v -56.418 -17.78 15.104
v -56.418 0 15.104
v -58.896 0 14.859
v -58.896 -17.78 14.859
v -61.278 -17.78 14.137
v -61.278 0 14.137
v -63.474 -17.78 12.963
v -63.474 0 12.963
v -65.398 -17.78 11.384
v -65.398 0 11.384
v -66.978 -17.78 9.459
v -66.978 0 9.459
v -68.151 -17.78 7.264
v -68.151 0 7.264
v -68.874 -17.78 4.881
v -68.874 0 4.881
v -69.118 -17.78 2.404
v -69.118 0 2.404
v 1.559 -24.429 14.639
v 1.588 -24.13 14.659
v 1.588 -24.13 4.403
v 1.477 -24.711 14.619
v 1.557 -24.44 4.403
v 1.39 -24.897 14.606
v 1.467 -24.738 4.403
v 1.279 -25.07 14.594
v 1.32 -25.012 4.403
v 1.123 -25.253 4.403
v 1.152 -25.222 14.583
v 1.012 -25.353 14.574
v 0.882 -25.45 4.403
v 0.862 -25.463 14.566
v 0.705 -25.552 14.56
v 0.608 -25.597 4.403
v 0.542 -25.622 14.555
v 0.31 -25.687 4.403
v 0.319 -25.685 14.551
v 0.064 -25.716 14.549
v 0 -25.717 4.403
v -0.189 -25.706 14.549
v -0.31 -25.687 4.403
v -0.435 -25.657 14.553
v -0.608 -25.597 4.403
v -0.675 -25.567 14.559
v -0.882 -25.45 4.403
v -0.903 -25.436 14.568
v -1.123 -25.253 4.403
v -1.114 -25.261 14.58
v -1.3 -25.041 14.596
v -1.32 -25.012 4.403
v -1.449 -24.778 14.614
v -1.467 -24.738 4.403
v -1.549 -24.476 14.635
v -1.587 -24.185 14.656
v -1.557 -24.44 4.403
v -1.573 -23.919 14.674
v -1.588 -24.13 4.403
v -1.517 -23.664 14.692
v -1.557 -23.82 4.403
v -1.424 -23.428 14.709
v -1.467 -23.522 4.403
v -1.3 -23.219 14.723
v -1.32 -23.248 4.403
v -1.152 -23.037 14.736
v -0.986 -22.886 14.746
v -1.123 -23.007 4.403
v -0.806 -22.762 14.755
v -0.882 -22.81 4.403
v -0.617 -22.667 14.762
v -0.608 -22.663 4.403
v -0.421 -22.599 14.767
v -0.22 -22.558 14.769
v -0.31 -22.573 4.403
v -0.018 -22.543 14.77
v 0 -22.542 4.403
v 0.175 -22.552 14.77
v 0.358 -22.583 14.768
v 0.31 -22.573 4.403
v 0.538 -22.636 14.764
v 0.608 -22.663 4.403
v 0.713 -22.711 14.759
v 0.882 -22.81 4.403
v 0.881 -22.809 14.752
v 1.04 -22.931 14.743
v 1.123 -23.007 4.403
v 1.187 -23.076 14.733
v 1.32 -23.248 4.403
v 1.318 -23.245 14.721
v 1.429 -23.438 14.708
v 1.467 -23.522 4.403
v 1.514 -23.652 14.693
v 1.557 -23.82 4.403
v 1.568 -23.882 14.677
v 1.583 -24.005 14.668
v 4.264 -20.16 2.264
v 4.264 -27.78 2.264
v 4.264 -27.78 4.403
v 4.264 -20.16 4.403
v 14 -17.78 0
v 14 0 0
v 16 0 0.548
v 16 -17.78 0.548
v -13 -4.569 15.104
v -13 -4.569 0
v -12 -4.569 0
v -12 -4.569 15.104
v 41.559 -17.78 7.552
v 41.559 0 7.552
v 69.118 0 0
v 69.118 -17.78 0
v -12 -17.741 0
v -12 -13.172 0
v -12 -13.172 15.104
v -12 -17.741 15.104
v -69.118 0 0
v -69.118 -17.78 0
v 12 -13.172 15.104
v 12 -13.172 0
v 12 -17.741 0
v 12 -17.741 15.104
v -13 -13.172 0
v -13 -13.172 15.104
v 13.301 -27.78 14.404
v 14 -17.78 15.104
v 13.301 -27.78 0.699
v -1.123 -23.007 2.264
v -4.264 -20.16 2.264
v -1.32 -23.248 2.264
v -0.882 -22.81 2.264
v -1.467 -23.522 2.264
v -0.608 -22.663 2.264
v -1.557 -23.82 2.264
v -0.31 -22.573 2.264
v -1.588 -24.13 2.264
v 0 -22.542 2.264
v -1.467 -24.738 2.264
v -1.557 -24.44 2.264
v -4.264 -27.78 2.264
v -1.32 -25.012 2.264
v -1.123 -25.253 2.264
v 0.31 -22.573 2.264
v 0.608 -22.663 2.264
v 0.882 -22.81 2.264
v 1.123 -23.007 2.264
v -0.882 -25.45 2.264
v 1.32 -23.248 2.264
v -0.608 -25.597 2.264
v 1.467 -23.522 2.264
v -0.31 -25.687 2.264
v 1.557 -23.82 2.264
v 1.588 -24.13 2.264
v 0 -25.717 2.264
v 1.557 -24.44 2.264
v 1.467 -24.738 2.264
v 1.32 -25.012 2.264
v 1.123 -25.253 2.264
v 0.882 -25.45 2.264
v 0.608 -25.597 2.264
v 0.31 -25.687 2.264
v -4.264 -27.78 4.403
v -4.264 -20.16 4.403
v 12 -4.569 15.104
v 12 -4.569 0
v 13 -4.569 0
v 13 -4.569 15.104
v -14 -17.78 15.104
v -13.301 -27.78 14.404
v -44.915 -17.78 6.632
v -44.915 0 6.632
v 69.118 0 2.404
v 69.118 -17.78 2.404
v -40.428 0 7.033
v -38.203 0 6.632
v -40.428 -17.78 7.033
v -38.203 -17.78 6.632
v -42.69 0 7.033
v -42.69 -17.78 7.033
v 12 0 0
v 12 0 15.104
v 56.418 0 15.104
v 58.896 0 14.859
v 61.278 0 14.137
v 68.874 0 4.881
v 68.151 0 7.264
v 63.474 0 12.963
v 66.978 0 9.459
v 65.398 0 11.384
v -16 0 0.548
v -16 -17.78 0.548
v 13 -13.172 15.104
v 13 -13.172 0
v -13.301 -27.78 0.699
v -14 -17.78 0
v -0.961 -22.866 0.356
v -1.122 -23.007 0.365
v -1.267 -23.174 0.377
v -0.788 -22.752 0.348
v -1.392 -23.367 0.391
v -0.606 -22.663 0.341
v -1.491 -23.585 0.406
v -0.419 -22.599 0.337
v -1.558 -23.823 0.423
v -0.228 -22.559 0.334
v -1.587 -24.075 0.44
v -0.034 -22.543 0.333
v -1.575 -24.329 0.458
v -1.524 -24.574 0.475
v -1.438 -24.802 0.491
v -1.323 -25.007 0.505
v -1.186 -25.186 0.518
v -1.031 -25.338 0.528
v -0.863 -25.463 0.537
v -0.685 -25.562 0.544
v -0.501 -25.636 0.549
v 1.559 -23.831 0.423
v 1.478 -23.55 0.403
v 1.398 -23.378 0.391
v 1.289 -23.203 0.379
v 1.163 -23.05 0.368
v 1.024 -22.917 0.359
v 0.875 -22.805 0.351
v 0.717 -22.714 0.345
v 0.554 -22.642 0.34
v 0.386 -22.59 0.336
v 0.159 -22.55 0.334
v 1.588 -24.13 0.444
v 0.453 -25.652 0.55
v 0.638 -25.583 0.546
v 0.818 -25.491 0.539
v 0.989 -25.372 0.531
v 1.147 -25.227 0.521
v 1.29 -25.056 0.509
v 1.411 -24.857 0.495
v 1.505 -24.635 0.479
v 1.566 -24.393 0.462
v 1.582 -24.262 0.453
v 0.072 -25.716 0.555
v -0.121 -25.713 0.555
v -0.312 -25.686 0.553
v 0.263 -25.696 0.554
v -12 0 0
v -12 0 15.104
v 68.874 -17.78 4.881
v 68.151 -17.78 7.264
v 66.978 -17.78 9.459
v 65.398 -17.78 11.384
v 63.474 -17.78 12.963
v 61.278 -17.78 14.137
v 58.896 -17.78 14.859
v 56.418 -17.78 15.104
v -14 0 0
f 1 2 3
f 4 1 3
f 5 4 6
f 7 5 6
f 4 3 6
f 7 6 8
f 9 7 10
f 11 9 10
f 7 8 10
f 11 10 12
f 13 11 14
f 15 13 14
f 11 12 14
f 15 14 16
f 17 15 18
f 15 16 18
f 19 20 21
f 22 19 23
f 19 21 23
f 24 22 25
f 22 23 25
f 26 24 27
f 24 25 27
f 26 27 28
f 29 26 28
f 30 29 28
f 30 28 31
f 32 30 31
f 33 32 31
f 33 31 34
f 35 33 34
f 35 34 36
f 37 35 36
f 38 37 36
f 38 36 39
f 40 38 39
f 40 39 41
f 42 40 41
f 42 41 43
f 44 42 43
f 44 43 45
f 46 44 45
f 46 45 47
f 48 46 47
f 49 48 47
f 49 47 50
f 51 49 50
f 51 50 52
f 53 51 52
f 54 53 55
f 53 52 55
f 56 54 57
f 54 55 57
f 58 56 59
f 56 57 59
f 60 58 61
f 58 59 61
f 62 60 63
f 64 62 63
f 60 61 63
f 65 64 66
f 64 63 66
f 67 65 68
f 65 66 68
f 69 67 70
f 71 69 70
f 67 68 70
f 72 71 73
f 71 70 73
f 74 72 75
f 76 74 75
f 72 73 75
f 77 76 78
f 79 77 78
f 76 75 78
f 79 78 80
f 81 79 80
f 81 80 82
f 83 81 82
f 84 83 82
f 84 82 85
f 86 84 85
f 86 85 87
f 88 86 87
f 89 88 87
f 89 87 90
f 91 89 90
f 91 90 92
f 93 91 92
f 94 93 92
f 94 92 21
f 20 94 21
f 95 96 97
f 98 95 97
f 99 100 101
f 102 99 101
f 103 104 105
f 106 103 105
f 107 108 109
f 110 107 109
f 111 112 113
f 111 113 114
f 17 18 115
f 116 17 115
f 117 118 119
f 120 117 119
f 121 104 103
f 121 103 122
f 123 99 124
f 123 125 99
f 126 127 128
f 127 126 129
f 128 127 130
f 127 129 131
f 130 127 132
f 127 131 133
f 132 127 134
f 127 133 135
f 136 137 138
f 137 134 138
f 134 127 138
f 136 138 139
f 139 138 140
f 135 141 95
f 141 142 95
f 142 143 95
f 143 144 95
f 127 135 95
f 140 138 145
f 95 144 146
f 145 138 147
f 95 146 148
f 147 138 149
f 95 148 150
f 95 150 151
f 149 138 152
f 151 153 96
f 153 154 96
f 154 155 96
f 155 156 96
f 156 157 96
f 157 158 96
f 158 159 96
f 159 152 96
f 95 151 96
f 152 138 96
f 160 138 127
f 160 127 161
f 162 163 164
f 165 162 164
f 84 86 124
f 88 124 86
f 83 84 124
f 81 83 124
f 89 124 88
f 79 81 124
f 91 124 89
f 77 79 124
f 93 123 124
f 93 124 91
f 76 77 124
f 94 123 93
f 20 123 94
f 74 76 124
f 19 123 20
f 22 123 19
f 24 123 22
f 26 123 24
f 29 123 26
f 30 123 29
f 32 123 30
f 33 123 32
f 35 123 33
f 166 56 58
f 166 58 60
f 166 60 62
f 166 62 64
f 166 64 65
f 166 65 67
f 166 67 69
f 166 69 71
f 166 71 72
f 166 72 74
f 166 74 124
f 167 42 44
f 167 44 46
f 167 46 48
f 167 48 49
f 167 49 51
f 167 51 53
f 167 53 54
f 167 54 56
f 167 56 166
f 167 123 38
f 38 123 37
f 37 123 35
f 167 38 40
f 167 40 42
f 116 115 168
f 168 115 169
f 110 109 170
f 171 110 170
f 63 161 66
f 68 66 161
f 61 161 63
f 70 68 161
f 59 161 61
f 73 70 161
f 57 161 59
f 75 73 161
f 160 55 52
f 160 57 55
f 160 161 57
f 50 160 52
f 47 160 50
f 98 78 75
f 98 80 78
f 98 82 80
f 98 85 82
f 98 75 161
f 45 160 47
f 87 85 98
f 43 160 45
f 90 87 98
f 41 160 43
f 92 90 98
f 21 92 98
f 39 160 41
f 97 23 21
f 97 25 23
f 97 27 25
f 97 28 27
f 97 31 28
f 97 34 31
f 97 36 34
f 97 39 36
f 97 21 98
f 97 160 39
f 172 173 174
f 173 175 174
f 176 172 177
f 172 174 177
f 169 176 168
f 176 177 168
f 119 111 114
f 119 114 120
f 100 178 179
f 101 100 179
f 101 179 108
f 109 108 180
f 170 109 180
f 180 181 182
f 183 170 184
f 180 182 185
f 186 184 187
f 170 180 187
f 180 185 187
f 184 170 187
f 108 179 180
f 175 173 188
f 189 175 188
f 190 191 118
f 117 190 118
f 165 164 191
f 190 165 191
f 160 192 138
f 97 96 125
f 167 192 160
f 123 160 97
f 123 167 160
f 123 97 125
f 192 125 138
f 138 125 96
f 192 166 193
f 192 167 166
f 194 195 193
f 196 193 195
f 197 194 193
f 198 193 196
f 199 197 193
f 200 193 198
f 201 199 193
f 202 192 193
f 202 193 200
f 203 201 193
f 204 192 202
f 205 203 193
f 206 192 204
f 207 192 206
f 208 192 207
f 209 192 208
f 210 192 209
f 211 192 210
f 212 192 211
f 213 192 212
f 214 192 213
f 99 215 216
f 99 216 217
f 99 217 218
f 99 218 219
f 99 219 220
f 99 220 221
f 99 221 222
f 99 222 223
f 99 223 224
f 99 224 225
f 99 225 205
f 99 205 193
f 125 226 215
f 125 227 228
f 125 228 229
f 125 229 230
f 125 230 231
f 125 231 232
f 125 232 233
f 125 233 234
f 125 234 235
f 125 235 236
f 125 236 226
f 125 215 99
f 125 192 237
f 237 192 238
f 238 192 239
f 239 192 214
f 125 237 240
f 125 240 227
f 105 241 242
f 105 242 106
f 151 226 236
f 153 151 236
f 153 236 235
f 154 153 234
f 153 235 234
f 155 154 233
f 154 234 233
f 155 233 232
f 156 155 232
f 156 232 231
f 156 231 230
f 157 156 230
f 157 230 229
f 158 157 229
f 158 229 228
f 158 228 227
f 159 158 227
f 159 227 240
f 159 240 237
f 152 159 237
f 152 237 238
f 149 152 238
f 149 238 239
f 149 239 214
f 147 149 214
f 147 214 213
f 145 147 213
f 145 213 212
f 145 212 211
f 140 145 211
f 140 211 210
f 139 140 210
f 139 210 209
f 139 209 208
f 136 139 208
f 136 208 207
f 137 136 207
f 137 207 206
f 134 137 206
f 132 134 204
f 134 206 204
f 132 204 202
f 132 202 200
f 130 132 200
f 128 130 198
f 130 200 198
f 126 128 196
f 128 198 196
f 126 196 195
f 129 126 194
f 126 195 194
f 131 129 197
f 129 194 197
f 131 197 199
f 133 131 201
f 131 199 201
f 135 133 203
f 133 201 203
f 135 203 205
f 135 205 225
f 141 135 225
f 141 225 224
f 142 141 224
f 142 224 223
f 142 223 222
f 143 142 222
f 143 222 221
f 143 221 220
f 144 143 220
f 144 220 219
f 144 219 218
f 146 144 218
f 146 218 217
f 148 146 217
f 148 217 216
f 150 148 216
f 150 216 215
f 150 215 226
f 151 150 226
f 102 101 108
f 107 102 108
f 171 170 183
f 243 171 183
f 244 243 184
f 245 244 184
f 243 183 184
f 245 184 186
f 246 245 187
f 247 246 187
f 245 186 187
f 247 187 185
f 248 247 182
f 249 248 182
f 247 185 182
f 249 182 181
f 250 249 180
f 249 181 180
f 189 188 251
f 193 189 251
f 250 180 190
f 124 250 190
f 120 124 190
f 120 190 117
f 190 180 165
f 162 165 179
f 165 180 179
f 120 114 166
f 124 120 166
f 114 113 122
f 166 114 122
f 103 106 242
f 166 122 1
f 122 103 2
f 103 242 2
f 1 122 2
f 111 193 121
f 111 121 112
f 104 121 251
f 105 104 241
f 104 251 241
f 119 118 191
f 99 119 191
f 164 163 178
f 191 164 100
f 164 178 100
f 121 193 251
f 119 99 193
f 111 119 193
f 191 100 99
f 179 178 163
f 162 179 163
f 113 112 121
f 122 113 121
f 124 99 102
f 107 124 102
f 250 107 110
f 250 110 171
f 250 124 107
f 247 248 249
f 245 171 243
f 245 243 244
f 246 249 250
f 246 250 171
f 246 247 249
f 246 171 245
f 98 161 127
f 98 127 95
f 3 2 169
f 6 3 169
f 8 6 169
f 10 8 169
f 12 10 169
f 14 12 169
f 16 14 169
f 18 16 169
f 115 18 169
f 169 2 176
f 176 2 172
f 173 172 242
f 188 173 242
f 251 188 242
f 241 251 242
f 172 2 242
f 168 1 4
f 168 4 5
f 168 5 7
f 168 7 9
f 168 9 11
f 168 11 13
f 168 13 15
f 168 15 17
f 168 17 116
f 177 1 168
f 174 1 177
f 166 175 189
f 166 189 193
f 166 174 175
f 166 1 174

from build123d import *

# Parameters (mm, degrees)
F0_W     = 14
F0_H     = 15.1035089948
F1_DEPTH = 17.78
F2_W     = 28
F2_H     = 15.1035089948
F3_DEPTH = 10
F3_TAPER = 4
F4_R     = 12.7
F5_W     = 1
F5_H     = 8.6030326784
F5_W_2   = 24
F5_H_2   = 4.5689390972
F5_R     = 1.5875
F6_DEPTH = 15.1045090948
F7_W     = 8.5285408422
F7_H     = 2.1393047646
F8_DEPTH = 7.62


# Not quite as in the source:
# - a feature names something its author has since deleted; it is built from what else it names


with BuildPart() as f1:
    # F0 (on Front) → F1 (new body)
    with BuildSketch(Plane.XZ):
        Polygon((-16, 0.5480427082), (-14, 0), (-14, 15.1035089948), (-16, 15.1035089948), align=None)
        with BuildLine():
            Line((-41.559, 7.5517544974), (-16, 0.5480427082))
            Line((-16, 0.5480427082), (-16, 15.1035089948))
            Line((-16, 15.1035089948), (-56.418, 15.1035089948))
            ThreePointArc((-56.418, 15.1035089948), (-65.3982561211, 11.3837651159), (-69.118, 2.4035089948))
            Line((-69.118, 2.4035089948), (-69.118, 0))
            Line((-69.118, 0), (-41.559, 7.5517544974))
        make_face()
        with Locations((-7, 7.5517544974)):
            Rectangle(F0_W, F0_H)
        with Locations((7, 7.5517544974)):
            Rectangle(F0_W, F0_H)
        with BuildLine():
            Line((16, 15.1035089948), (16, 0.5480427082))
            Line((16, 0.5480427082), (41.559, 7.5517544974))
            Line((41.559, 7.5517544974), (69.118, 0))
            Line((69.118, 0), (69.118, 2.4035089948))
            ThreePointArc((69.118, 2.4035089948), (65.3982561211, 11.3837651159), (56.418, 15.1035089948))
            Line((56.418, 15.1035089948), (16, 15.1035089948))
        make_face()
        Polygon((14, 15.1035089948), (14, 0), (16, 0.5480427082), (16, 15.1035089948), align=None)
    extrude(amount=F1_DEPTH)

    # F2 (on face) → F3 (join)
    with BuildSketch(Plane.XZ.offset(17.78)):
        with Locations((0, 7.5517544974)):
            Rectangle(F2_W, F2_H)
    extrude(amount=F3_DEPTH, taper=F3_TAPER)

    # F4
    f4_edges = [f1.edges().sort_by_distance(p)[0] for p in [
        (-41.559, -8.89, 7.551754),
    ]]
    fillet(f4_edges, radius=F4_R)

    # F5 (on face) → F6 (cut, through all)
    with BuildSketch(Plane(origin=(0, 0, 0), x_dir=(1, 0, 0), z_dir=(0, 0, -1))):
        with Locations((-12.5, 8.8704554364)):
            Rectangle(F5_W, F5_H)
        with Locations((0, 8.8704554364)):
            Rectangle(F5_W_2, F5_H)
        with Locations((0, 2.2844695486)):
            Rectangle(F5_W_2, F5_H_2)
        with Locations((12.5, 8.8704554364)):
            Rectangle(F5_W, F5_H)
        with Locations((0, 15.4564413242)):
            Rectangle(F5_W_2, F5_H_2)
        with Locations((0, 24.13)):
            Circle(F5_R)
    extrude(amount=-F6_DEPTH, mode=Mode.SUBTRACT)

    # F7 (on face) → F8 (cut)
    with BuildSketch(Plane.XZ.offset(27.78)):
        with Locations((0, 3.333498491)):
            Rectangle(F7_W, F7_H)
    extrude(amount=-F8_DEPTH, mode=Mode.SUBTRACT)


solid = f1.part
